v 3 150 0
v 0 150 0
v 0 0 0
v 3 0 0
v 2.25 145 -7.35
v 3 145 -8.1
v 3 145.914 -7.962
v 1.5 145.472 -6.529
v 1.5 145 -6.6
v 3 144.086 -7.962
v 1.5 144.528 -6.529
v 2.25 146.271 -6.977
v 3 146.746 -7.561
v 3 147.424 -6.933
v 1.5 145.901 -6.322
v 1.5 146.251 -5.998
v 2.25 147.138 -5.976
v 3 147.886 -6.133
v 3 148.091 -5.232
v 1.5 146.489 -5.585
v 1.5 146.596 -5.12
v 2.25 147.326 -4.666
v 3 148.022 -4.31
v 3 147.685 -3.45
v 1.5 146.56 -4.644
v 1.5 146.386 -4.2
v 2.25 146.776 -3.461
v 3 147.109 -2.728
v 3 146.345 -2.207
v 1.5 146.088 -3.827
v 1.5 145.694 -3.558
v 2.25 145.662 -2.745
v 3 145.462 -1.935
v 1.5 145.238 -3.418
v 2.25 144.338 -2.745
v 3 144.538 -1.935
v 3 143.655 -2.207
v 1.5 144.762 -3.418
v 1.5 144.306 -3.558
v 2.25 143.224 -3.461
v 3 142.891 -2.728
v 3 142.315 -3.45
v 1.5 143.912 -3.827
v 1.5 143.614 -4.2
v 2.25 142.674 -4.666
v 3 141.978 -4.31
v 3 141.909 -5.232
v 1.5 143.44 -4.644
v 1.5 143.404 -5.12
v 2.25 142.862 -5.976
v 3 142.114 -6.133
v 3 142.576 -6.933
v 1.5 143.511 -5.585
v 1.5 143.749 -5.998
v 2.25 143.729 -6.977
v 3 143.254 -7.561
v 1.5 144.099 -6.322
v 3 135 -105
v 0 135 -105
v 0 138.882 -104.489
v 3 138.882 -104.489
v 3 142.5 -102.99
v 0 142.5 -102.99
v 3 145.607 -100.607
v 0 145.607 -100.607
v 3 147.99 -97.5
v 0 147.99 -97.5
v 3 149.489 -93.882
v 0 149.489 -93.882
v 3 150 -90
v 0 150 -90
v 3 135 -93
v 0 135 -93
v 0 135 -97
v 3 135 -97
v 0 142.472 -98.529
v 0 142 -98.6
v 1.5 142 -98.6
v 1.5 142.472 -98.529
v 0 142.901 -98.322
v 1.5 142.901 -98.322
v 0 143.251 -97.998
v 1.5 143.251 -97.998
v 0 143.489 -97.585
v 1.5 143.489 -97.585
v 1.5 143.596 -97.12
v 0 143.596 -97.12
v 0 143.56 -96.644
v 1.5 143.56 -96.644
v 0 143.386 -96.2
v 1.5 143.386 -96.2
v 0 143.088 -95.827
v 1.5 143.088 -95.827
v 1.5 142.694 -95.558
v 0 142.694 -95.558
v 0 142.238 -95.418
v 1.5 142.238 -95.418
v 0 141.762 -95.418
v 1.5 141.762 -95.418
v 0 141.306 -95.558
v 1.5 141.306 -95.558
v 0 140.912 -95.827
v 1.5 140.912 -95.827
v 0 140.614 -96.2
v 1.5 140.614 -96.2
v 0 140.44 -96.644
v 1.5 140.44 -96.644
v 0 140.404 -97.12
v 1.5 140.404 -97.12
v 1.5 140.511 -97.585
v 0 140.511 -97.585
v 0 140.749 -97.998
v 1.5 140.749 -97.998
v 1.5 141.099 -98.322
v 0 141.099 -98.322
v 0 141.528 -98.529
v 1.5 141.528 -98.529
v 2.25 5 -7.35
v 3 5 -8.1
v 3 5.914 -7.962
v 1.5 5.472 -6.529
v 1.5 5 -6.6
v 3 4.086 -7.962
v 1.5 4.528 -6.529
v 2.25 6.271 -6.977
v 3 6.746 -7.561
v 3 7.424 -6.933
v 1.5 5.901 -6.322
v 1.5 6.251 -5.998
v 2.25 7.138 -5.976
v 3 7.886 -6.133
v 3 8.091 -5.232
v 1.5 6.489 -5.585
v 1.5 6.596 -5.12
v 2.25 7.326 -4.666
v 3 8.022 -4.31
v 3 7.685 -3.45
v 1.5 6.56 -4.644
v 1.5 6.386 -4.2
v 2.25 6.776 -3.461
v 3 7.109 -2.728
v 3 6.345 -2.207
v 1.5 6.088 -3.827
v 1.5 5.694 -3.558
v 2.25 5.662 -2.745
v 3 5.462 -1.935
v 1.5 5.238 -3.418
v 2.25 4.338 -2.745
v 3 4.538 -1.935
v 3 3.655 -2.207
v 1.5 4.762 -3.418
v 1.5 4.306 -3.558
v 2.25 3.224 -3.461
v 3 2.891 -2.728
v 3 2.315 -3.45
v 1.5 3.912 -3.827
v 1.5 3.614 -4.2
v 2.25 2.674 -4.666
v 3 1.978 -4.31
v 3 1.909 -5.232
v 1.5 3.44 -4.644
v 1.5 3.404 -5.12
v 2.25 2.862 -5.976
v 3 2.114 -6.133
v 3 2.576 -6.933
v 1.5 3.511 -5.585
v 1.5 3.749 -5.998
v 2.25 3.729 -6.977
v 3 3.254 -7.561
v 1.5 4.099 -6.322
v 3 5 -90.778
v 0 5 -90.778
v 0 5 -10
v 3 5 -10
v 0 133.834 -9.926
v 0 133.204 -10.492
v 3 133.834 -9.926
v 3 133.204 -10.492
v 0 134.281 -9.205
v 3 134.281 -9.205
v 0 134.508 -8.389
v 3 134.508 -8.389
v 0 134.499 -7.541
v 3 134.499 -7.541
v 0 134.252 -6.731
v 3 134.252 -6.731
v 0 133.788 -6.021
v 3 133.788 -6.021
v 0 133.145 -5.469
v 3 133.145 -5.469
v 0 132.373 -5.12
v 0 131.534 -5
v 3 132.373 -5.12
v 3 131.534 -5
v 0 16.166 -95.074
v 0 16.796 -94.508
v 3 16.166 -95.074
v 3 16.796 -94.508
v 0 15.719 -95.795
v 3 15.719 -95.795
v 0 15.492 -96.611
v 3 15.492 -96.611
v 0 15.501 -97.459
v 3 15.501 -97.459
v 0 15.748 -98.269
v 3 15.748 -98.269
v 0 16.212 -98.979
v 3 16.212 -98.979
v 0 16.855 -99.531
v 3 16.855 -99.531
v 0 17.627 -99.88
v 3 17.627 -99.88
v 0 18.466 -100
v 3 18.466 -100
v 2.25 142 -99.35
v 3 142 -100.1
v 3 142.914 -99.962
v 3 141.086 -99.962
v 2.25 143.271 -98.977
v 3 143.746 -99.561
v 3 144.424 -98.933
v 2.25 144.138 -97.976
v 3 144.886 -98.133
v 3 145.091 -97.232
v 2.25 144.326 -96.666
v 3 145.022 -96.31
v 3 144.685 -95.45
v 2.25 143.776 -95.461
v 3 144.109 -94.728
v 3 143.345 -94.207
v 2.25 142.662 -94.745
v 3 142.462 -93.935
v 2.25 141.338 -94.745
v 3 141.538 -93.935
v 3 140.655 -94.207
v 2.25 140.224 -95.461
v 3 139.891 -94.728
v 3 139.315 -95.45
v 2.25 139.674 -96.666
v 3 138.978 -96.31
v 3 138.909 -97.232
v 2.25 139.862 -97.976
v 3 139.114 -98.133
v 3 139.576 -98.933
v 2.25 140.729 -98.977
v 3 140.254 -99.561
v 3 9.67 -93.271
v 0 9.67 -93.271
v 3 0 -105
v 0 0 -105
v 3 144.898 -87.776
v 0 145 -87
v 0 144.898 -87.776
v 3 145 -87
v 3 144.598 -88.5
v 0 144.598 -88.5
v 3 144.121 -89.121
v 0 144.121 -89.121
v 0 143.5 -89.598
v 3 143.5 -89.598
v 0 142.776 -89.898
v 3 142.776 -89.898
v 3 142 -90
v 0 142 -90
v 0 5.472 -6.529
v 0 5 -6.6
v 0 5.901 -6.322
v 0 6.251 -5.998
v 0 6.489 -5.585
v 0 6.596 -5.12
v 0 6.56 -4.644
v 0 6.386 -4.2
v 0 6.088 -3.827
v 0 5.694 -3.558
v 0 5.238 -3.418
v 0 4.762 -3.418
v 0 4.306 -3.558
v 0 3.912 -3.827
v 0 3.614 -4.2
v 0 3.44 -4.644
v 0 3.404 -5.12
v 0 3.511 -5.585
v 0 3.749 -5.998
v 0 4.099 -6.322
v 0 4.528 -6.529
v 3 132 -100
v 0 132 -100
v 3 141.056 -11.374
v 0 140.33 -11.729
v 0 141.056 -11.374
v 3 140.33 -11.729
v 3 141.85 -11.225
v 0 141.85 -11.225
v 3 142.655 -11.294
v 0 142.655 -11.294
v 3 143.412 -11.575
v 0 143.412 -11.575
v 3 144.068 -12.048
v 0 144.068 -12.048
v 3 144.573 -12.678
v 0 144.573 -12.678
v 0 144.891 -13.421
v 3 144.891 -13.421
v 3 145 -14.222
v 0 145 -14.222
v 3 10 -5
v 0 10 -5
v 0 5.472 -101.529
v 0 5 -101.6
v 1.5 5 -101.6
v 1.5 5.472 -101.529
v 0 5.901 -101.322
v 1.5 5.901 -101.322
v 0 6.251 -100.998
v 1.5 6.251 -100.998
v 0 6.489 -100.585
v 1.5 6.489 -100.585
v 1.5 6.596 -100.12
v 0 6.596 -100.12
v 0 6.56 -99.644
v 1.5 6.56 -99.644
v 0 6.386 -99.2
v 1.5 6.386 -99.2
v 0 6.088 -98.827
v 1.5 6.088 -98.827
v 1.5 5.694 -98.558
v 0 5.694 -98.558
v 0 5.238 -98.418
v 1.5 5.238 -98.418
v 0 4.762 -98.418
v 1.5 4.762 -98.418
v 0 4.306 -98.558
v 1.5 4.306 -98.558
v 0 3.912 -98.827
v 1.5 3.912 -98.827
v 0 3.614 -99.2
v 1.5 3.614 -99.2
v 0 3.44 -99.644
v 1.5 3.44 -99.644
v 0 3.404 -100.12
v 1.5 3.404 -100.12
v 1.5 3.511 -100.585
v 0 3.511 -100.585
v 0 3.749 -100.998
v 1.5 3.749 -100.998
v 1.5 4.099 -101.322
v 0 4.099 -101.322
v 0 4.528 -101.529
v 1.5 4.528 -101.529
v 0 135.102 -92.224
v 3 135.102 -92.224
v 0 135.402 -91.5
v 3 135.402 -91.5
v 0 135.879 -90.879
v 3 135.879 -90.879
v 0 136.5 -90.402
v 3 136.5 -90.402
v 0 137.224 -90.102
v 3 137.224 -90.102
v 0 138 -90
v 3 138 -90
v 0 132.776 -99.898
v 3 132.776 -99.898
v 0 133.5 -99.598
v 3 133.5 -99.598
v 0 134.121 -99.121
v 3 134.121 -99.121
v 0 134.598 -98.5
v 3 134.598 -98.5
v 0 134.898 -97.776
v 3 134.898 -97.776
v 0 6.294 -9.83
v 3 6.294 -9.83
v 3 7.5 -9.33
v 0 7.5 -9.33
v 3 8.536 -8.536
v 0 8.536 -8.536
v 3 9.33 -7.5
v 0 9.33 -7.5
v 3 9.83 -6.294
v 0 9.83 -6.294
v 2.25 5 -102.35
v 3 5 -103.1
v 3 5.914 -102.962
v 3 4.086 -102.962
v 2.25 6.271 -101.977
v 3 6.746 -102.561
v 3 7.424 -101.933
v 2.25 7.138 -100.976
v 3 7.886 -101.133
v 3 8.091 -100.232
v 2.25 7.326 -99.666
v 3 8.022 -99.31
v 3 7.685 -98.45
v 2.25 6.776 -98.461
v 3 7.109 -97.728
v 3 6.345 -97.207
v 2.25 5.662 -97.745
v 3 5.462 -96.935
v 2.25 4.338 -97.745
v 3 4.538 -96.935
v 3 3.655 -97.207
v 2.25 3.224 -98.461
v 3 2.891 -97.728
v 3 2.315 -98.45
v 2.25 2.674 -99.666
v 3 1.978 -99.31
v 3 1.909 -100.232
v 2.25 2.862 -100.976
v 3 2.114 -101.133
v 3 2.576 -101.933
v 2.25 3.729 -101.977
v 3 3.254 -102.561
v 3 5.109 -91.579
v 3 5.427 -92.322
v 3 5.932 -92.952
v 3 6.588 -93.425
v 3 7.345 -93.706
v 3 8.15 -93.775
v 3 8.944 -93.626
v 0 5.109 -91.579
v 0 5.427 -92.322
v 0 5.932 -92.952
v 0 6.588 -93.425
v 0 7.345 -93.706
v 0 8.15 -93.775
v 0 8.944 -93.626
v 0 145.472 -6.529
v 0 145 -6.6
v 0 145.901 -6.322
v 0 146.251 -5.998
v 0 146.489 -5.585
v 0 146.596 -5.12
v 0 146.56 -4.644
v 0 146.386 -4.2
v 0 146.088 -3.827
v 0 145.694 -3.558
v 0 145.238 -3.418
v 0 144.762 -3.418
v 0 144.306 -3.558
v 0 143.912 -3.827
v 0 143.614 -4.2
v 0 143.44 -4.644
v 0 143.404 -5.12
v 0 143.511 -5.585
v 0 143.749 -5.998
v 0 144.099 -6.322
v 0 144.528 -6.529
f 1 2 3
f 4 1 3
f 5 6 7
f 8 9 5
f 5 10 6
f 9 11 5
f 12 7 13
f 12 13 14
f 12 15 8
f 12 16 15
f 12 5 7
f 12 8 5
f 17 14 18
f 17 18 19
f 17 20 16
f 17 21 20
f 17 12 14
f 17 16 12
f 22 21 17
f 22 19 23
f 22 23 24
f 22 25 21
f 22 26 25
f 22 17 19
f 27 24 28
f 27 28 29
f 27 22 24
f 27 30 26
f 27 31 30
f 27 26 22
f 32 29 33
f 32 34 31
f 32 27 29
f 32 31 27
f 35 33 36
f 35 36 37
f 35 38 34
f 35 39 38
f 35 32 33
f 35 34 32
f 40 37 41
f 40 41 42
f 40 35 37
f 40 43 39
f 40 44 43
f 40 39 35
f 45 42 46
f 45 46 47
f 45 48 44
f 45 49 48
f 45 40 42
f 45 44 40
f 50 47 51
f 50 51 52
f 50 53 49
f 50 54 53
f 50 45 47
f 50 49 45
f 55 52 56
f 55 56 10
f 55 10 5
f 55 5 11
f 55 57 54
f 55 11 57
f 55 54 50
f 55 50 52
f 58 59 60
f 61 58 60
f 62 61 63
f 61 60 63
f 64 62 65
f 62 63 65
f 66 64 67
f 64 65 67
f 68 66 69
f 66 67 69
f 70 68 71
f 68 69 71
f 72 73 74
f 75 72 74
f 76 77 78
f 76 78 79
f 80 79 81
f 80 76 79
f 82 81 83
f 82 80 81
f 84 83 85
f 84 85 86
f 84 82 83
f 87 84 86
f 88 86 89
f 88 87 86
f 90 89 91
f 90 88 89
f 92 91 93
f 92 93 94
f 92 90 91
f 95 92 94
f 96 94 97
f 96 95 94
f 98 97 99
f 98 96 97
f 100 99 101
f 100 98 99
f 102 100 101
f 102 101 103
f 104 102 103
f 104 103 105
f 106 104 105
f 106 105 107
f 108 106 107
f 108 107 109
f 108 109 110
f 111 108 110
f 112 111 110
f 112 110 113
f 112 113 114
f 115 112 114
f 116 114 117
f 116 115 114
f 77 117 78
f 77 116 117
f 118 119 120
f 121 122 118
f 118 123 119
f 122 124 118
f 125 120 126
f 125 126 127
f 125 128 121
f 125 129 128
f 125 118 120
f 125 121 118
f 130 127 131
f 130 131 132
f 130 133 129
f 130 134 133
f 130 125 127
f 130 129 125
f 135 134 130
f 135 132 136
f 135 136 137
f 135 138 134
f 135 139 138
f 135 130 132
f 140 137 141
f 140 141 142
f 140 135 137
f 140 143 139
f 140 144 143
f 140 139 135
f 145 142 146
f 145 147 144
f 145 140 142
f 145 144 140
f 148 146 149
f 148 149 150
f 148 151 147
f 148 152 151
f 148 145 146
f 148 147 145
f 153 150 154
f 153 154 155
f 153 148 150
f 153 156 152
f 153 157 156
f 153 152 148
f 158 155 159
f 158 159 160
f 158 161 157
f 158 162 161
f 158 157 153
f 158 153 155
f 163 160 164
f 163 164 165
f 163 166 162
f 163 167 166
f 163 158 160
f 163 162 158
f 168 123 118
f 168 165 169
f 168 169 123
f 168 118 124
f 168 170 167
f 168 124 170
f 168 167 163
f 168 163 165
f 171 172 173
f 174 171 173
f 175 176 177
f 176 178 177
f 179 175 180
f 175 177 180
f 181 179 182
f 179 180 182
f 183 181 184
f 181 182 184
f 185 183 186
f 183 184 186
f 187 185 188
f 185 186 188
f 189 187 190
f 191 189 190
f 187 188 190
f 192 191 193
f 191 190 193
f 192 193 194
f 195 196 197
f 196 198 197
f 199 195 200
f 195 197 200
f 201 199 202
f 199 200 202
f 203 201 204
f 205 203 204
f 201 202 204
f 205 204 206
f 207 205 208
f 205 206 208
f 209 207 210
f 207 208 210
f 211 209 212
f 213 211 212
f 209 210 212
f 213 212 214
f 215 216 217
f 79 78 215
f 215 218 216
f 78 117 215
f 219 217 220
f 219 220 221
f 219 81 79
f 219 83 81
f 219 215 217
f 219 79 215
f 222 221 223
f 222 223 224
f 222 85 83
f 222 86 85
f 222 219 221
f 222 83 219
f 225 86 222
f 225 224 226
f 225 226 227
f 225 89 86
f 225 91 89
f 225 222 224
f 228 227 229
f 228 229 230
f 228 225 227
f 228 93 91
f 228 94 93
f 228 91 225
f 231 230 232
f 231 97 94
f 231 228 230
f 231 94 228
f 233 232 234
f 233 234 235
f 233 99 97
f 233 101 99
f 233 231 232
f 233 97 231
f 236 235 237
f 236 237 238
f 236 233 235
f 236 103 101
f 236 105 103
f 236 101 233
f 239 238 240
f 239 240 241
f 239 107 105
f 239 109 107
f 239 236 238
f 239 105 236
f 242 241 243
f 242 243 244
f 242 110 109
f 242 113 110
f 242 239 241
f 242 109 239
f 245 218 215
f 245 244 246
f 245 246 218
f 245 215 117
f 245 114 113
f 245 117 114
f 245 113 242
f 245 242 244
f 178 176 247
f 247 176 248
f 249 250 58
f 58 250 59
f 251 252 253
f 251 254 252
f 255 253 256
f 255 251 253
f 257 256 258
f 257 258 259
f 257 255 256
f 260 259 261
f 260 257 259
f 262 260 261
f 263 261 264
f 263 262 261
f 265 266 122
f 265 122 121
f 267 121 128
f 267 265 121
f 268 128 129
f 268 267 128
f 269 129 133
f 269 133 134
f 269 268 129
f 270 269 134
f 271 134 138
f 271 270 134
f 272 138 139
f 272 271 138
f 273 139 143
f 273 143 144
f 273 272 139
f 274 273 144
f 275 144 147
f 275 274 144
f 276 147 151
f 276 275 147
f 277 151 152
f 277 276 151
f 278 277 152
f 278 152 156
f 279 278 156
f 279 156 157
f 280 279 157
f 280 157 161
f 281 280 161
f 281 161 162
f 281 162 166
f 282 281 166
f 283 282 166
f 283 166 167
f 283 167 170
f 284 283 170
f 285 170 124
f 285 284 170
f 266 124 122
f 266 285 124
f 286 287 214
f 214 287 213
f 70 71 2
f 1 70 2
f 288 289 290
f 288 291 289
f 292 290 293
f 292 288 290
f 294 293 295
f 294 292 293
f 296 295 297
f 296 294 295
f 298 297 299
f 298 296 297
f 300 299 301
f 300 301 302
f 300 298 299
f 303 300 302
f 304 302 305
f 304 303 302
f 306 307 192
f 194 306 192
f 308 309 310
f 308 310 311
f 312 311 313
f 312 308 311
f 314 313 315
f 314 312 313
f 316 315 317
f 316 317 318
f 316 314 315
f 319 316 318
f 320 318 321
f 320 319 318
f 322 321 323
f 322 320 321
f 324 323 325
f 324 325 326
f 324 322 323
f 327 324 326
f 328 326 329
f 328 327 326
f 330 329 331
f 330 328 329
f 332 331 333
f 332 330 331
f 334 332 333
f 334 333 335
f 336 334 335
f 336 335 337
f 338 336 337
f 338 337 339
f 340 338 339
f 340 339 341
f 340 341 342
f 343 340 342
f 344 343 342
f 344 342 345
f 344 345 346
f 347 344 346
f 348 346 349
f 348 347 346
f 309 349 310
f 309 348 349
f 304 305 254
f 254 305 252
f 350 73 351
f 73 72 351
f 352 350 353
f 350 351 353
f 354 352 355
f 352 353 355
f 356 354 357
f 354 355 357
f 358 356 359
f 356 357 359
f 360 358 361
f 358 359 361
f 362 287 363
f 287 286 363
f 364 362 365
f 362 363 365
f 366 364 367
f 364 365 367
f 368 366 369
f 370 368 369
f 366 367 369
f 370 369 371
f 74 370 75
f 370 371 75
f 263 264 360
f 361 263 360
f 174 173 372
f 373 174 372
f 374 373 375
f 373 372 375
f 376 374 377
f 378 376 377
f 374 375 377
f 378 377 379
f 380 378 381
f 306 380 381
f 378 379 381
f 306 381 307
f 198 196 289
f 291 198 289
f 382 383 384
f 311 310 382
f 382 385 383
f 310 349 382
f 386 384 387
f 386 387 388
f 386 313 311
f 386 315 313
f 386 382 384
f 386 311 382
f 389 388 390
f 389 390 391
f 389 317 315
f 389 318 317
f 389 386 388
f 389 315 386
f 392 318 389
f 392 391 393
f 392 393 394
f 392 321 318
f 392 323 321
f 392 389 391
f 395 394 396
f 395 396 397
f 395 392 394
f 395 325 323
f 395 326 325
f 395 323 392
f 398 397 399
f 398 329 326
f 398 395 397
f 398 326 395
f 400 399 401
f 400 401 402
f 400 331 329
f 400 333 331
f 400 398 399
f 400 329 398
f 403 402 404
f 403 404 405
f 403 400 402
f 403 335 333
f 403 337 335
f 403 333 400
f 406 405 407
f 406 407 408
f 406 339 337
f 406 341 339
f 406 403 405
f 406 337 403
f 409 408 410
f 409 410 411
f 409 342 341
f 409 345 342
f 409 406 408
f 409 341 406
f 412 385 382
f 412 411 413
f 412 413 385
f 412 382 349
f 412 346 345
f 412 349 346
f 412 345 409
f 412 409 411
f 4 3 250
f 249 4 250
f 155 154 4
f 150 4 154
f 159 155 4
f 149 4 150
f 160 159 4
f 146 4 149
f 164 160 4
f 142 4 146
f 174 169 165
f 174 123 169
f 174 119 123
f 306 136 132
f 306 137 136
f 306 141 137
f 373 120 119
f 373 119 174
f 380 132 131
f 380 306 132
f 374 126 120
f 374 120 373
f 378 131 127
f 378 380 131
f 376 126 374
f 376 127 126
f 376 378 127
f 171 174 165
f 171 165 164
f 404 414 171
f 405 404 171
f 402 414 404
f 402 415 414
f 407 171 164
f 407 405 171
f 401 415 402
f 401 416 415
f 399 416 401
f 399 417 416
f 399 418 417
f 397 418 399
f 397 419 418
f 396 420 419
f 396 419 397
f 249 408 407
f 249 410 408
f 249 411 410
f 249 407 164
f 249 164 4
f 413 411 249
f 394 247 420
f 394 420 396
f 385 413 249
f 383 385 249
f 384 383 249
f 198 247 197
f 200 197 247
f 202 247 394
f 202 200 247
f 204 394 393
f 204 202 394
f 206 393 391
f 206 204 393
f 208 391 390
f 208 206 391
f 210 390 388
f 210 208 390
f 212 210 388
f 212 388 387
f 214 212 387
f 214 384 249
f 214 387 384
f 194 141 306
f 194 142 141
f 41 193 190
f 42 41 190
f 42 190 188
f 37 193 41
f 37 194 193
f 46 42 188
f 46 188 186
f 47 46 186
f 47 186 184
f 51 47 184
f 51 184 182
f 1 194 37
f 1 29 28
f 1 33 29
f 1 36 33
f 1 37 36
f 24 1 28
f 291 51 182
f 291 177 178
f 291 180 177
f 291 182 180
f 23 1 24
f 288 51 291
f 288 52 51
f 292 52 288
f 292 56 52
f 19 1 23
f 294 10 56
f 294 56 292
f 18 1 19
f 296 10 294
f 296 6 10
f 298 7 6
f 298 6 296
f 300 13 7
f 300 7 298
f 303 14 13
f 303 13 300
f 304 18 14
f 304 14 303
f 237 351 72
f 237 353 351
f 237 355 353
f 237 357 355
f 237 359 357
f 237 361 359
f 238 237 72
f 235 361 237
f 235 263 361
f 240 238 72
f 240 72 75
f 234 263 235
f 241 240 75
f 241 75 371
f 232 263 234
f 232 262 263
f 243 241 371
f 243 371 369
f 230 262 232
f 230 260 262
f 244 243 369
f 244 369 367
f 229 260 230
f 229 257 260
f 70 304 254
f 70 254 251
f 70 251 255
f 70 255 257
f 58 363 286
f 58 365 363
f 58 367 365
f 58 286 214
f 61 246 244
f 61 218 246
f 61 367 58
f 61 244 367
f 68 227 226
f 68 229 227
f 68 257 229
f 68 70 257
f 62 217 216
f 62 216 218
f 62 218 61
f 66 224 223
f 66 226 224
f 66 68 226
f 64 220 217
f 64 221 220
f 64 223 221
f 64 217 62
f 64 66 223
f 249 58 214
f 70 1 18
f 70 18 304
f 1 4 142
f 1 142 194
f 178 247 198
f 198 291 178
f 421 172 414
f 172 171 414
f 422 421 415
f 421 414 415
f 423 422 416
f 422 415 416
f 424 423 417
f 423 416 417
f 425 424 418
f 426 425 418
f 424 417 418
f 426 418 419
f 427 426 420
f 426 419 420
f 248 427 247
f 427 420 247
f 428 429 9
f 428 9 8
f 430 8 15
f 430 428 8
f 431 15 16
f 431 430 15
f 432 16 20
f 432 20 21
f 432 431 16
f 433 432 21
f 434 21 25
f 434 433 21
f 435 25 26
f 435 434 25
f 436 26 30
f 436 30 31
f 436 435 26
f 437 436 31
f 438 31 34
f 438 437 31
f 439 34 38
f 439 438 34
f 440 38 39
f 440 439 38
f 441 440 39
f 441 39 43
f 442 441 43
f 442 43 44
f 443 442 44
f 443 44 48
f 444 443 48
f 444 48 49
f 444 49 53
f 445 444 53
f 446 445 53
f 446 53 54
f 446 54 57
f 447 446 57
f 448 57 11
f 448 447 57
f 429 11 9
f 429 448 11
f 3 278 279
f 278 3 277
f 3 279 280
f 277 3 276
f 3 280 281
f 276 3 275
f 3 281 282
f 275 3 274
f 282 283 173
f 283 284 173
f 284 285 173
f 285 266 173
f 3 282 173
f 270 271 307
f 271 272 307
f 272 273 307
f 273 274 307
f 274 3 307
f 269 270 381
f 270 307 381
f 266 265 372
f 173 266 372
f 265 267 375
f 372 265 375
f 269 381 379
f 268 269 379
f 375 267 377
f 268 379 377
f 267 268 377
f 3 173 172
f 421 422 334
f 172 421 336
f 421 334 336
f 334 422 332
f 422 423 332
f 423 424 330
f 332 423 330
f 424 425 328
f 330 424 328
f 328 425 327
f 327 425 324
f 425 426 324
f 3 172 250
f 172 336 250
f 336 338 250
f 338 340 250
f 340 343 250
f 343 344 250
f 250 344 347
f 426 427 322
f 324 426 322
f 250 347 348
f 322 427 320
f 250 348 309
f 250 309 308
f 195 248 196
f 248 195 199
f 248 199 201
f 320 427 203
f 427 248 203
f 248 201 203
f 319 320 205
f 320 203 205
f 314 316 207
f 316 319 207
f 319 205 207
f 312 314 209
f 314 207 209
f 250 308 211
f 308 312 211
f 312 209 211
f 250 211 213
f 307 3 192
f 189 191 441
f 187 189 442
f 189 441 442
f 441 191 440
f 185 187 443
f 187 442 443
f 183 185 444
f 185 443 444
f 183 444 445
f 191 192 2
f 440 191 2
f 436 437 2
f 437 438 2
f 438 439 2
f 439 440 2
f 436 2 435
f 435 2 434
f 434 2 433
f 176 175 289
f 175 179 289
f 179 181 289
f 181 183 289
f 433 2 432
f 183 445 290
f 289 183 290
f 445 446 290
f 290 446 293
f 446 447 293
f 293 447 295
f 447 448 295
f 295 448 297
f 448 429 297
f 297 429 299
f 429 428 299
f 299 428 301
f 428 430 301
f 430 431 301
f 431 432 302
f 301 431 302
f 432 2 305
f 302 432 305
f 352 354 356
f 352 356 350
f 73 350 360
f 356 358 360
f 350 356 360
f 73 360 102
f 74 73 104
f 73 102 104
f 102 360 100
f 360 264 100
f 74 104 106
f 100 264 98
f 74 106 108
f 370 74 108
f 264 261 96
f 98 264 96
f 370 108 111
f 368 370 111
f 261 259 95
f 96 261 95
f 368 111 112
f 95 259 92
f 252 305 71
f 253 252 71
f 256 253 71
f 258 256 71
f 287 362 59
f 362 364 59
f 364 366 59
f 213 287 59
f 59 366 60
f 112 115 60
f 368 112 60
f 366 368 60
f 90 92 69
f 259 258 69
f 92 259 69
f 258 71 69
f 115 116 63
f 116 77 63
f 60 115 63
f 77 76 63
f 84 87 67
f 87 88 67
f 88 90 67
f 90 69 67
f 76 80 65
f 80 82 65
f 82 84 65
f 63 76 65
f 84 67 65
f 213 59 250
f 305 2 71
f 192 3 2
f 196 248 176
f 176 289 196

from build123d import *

# Parameters (mm, degrees)
SKETCH1_R           = 1.6
BOSS_EXTRUDE2_DEPTH = 3
FILLET1_R           = 3
CHAMFER1_SIZE       = 1.5


with BuildPart() as part:
    # Sketch1 → Boss-Extrude2 (new body)
    with BuildSketch(Plane(origin=(0, 0, 0), x_dir=(0, 0, -1), z_dir=(1, 0, 0))):
        with BuildLine():
            Line((0, 0), (105, 0))
            Line((105, 0), (105, 135))
            ThreePointArc((105, 135), (100.606601718, 145.606601718), (90, 150))
            Line((90, 150), (0, 150))
            Line((0, 150), (0, 0))
        make_face()
        with Locations((5, 145)):
            Circle(SKETCH1_R, mode=Mode.SUBTRACT)
        with Locations((97, 142)):
            Circle(SKETCH1_R, mode=Mode.SUBTRACT)
        with Locations((100, 5)):
            Circle(SKETCH1_R, mode=Mode.SUBTRACT)
        with Locations((5, 5)):
            Circle(SKETCH1_R, mode=Mode.SUBTRACT)
        Polygon((8.6, 145), (90, 145), (90, 135), (100, 135), (100, 8.6), align=None, mode=Mode.SUBTRACT)
        with BuildLine():
            Line((5, 10), (5, 141.4))
            Line((5, 141.4), (96.4, 5))
            Line((96.4, 5), (10, 5))
            ThreePointArc((10, 5), (8.535533906, 8.535533906), (5, 10))
        make_face(mode=Mode.SUBTRACT)
    extrude(amount=BOSS_EXTRUDE2_DEPTH)

    # Fillet1
    fillet1_edges = [part.edges().sort_by_distance(p)[0] for p in [
        (1.5, 5, -96.4),
        (1.5, 141.4, -5),
        (1.5, 145, -90),
        (1.5, 145, -8.6),
        (1.5, 8.6, -100),
        (1.5, 135, -100),
        (1.5, 135, -90),
    ]]
    fillet(fillet1_edges, radius=FILLET1_R)

    # Chamfer1
    chamfer1_edges = [part.edges().sort_by_distance(p)[0] for p in [
        (3, 5, -3.4),
        (3, 5, -98.4),
        (3, 142, -95.4),
        (3, 145, -3.4),
    ]]
    chamfer(chamfer1_edges, length=CHAMFER1_SIZE)


solid = part.part
